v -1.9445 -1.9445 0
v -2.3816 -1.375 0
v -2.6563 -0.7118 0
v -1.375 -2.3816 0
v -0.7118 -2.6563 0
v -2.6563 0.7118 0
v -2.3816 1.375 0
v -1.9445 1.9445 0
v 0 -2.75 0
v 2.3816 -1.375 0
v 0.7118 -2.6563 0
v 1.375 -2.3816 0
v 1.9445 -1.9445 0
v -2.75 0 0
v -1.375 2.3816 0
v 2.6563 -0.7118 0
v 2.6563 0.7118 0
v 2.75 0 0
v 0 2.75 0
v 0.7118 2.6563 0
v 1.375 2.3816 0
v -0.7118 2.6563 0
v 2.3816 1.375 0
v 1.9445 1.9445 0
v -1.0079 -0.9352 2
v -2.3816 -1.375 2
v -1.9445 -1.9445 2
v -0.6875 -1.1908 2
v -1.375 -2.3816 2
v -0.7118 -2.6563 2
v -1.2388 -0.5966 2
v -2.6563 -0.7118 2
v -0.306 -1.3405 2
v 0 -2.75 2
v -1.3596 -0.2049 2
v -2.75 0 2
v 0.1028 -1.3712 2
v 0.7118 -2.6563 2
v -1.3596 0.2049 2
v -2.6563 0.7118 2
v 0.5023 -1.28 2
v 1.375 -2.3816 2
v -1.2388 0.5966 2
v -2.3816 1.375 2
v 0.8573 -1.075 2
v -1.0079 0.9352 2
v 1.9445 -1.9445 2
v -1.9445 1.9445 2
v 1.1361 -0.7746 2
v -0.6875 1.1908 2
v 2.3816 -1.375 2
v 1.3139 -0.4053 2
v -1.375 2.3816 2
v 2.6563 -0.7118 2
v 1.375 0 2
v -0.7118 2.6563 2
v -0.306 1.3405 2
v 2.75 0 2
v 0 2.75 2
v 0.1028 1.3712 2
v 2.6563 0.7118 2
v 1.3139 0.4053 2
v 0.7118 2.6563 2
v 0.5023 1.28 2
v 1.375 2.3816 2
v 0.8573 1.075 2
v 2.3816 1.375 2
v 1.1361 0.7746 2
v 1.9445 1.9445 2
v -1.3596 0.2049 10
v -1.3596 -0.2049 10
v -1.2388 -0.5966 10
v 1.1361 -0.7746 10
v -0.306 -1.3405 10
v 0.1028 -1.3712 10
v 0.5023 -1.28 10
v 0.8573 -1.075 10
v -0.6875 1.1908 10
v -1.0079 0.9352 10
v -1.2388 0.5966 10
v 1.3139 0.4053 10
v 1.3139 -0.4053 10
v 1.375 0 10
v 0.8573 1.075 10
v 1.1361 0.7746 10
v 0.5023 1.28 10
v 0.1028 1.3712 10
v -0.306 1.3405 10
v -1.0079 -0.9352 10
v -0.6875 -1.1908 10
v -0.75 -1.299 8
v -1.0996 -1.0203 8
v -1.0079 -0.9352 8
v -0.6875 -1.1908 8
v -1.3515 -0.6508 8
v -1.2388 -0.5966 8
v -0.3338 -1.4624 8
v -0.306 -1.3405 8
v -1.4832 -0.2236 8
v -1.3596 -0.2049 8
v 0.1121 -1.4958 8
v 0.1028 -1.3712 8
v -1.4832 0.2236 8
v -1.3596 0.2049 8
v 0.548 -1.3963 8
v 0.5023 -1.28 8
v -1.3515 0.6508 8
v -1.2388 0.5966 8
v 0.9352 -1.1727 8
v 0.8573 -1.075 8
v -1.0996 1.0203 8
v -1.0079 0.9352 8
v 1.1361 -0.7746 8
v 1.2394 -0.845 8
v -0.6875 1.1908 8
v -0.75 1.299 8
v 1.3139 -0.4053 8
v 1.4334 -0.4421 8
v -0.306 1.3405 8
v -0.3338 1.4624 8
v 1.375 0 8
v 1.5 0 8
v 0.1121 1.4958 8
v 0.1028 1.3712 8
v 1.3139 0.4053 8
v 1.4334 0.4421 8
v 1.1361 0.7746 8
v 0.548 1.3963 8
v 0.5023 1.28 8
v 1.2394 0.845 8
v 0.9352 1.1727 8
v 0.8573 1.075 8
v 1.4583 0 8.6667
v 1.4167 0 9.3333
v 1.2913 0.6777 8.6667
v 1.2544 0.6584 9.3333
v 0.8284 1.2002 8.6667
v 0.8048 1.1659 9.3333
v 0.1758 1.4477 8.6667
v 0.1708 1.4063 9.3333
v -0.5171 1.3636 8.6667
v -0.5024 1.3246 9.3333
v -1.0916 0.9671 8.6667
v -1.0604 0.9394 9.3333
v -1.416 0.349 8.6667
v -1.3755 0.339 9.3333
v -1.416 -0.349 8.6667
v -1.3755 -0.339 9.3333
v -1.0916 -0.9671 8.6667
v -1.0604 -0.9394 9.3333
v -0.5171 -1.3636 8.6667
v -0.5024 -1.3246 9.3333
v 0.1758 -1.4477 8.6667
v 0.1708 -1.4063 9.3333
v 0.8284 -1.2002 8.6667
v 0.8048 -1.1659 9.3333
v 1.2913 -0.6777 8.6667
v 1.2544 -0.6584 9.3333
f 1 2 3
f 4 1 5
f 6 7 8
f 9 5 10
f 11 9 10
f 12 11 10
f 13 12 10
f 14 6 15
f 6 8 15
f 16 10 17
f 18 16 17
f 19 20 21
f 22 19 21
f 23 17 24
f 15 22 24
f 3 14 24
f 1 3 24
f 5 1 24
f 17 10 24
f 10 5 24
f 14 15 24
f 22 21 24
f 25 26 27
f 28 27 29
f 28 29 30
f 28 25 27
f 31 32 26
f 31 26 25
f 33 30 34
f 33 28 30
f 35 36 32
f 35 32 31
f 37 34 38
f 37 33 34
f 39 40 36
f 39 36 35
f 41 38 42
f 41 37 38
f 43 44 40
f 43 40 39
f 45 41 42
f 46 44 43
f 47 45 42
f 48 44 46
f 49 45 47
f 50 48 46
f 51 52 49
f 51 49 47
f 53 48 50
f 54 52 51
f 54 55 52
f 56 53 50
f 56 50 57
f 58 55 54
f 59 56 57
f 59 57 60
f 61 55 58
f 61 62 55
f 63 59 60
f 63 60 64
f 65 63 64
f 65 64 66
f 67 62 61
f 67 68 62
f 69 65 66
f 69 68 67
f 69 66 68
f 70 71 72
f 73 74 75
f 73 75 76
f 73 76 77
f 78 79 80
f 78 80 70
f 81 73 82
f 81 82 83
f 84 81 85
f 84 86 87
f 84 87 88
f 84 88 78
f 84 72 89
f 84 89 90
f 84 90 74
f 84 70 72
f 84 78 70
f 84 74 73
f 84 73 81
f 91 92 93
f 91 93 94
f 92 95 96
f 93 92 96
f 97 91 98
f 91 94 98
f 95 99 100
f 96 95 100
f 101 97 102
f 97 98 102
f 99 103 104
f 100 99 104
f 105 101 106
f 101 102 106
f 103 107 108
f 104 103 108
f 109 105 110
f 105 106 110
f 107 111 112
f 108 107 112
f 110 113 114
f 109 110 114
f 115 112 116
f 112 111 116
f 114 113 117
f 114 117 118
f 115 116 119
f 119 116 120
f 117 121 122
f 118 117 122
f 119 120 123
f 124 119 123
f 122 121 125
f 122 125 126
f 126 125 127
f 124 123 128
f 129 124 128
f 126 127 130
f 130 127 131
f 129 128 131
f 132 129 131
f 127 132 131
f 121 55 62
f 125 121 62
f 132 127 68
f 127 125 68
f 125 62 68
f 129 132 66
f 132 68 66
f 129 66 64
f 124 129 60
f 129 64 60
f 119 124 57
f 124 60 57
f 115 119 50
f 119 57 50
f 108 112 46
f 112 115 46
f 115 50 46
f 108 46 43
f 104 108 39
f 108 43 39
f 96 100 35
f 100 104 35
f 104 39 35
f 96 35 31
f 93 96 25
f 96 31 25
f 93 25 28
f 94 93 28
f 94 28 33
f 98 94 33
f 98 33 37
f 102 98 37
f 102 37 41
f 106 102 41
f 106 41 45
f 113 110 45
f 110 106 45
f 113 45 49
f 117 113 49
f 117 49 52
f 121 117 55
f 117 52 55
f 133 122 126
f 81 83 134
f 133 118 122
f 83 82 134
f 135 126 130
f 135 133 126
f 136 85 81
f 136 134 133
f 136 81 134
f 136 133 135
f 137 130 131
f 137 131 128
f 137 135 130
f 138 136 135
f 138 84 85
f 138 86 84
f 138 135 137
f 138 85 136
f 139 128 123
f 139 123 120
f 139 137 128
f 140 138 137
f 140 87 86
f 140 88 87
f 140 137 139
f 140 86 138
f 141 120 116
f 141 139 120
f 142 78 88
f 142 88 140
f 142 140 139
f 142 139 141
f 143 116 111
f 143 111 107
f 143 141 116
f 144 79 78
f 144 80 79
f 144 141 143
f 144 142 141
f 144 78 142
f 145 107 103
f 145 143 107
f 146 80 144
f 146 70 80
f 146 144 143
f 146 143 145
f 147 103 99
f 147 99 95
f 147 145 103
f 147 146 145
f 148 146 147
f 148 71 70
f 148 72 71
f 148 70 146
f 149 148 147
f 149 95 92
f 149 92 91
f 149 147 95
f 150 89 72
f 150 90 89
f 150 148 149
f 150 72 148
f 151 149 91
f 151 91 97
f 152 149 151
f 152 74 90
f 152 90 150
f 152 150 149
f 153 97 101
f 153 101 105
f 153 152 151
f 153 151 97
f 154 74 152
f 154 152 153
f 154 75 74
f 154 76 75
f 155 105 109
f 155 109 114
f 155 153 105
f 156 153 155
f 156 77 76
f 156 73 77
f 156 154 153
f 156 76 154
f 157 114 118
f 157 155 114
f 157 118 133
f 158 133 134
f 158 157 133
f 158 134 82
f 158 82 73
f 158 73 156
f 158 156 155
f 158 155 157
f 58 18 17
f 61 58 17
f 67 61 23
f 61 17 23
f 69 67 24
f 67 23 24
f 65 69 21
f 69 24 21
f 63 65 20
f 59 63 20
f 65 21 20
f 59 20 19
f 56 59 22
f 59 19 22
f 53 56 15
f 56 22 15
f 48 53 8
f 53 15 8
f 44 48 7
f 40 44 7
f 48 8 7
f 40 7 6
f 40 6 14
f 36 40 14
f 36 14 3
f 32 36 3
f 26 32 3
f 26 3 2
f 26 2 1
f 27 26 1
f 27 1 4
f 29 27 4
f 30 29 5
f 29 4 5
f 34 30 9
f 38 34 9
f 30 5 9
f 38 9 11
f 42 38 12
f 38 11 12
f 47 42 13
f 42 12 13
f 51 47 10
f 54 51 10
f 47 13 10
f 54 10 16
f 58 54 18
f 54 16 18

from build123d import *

# Parameters (mm, degrees)
F0_R      = 2.75
F0_R_2    = 1.375
F1_DEPTH  = 2
F2_DEPTH  = 10
F4_R      = 1.5
F2_FACE_R = 1.375


with BuildPart() as f1:
    # F0 (on Top) → F1 (new body)
    with BuildSketch(Plane.XY):
        Circle(F0_R)
        Circle(F0_R_2, mode=Mode.SUBTRACT)
        Circle(F0_R_2)
    extrude(amount=F1_DEPTH)

    # F0 (on Top) → F2 (join)
    with BuildSketch(Plane.XY):
        Circle(F0_R_2)
    extrude(amount=F2_DEPTH)

    # F4 (on offset) → F5 section 0
    with BuildSketch(Plane.XY.offset(8)):
        Circle(F4_R)
    # F2_face (on face) → F5 section 1
    with BuildSketch(Plane.XY.offset(10)):
        Circle(F2_FACE_R)
    loft()


solid = f1.part
